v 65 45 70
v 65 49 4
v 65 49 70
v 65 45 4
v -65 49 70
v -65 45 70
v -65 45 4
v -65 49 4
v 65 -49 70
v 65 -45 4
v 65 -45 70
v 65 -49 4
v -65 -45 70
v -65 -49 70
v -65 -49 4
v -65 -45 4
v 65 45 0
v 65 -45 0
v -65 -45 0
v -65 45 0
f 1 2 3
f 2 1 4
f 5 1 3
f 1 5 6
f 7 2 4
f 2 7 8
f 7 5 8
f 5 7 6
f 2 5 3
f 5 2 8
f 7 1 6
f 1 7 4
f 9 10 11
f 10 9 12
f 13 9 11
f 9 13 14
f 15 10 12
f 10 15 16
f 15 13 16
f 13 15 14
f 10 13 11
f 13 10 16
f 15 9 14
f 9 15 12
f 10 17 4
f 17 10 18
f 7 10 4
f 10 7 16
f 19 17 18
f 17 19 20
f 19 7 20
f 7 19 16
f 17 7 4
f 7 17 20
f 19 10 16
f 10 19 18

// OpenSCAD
// Parameters (mm)
plate_x = 130;          // Plate length (X direction)
plate_y = 90;           // Plate width  (Y direction)
plate_thick = 4;        // Plate thickness (Z direction)
hole_d = 30.5;          // Diameter of tube holes
hole_spacing = 40;      // Centre‑to‑centre spacing of holes (both X and Y)
wall_thick = 4;         // Thickness of the side walls (Y direction)
wall_height = 70;       // Total height of the side walls (Z direction)
$fn = 64;                // Resolution for circles and cylinders

// Helper: plate base (centered on origin, Z from 0 to plate_thick)
module plate() {
    translate([-plate_x/2, -plate_y/2, 0])
        cube([plate_x, plate_y, plate_thick]);
}

// Helper: side walls (flush with long edges of the plate)
module side_walls() {
    // Wall runs along X, thickness in Y, rises from plate_thick to wall_height
    wall_z = wall_height - plate_thick; // height above the plate
    // Positive Y wall (inner face at Y = +plate_y/2)
    translate([-plate_x/2,  plate_y/2, plate_thick])
        cube([plate_x, wall_thick, wall_z]);
    // Negative Y wall (inner face at Y = -plate_y/2)
    translate([-plate_x/2, -plate_y/2 - wall_thick, plate_thick])
        cube([plate_x, wall_thick, wall_z]);
}

// Helper: holes (through the plate only)
module plate_holes() {
    // Cylinder height slightly larger than plate to avoid coplanar faces
    cyl_h = plate_thick + 0.2; // extra 0.1 mm on each side
    cyl_z = -0.1; // start just below the plate bottom
    for (ix = [-1, 0, 1])          // three columns
        for (iy = [-1, 1])          // two rows
            translate([ix*hole_spacing, iy*hole_spacing, cyl_z])
                cylinder(d = hole_d, h = cyl_h, center = false);
}

// Assemble the rack
union() {
    plate();
    side_walls();
}
difference() {
    // The object we just built (union of plate and walls)
    union() {
        plate();
        side_walls();
    }
    // Subtract only the plate holes
    plate_holes();
}
